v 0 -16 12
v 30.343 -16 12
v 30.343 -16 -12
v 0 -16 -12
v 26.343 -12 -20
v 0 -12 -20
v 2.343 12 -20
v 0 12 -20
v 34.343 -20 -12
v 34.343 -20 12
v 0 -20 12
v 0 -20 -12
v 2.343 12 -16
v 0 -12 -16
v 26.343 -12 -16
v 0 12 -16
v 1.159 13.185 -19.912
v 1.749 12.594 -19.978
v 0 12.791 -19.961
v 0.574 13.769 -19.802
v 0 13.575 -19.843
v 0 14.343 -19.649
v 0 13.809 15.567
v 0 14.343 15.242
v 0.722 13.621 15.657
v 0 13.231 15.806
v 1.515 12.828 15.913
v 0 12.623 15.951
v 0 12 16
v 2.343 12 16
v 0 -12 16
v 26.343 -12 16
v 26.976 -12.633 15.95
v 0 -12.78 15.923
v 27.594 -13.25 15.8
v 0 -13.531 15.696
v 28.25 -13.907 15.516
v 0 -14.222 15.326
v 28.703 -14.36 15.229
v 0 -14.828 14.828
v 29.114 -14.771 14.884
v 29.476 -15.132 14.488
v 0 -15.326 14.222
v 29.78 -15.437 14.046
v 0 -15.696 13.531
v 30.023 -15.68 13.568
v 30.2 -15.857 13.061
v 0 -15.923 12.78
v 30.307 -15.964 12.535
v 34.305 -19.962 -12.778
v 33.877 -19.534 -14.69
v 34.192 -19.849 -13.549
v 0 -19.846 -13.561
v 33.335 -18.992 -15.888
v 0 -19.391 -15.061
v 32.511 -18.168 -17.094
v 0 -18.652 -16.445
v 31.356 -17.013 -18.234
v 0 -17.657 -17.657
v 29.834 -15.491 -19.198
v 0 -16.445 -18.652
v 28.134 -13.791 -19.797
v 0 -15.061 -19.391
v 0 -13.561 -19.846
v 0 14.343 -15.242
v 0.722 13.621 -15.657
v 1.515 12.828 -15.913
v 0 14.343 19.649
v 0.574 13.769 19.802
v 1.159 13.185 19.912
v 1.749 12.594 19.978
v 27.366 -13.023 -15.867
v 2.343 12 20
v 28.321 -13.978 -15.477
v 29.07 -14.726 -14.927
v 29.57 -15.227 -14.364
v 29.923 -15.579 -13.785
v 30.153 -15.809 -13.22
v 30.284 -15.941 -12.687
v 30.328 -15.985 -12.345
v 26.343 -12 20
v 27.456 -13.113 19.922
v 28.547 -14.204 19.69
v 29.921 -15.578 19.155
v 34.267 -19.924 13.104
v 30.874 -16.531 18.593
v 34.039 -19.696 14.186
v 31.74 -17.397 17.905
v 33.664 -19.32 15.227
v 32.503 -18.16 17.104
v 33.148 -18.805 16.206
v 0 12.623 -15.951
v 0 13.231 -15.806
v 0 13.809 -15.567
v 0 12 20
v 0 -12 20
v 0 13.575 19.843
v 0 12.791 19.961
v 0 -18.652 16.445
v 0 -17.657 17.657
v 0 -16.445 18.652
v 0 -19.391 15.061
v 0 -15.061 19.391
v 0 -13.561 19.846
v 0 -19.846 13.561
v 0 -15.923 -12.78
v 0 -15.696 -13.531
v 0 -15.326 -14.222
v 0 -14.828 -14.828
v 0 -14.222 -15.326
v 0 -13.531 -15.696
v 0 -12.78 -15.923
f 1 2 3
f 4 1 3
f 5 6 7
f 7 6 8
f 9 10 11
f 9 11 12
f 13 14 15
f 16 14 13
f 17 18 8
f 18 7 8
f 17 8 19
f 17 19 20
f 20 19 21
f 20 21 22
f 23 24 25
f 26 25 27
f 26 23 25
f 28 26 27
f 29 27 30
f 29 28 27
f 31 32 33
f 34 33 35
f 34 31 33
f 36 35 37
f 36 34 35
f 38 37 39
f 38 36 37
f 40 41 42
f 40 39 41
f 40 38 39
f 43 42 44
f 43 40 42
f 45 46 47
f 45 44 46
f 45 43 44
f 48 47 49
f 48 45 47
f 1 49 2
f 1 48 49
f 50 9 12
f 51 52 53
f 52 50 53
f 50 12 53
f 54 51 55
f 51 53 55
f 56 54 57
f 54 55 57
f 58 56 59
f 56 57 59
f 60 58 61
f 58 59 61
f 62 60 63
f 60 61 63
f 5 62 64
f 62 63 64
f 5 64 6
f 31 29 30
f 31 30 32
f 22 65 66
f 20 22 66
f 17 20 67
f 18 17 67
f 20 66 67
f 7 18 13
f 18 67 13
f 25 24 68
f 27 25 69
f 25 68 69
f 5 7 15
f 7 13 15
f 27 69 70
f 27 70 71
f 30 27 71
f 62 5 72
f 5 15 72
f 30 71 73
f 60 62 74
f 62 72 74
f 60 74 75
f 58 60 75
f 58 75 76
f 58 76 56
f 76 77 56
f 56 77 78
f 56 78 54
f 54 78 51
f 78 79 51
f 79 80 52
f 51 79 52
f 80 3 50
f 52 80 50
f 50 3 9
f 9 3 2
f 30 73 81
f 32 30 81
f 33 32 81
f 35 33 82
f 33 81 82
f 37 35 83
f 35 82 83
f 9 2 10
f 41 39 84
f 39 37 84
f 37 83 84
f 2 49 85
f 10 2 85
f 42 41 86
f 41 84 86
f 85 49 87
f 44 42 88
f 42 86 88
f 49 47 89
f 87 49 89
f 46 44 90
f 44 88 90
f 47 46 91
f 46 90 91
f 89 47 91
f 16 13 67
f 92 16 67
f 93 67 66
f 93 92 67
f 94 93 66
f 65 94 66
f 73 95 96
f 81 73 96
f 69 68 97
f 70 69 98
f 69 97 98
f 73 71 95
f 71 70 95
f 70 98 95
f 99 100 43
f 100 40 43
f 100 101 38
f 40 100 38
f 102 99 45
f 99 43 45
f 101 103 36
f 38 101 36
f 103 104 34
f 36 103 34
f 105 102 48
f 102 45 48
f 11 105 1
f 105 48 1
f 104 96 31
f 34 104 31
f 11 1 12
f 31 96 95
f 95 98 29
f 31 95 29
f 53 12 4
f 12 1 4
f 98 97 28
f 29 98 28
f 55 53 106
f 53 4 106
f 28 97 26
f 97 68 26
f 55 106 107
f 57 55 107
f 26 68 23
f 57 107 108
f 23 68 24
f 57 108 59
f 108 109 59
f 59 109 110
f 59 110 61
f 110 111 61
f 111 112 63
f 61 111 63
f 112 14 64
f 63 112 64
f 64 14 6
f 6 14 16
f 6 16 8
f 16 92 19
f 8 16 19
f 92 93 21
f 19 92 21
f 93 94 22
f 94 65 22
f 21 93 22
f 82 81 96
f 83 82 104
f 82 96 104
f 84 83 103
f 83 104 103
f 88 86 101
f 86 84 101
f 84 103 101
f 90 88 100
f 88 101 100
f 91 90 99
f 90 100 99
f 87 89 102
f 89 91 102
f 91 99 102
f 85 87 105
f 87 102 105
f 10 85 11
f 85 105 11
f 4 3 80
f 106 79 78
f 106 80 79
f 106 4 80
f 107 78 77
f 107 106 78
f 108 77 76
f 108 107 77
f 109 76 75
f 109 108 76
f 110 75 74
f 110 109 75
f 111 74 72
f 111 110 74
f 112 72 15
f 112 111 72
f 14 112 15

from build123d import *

# Parameters (mm, degrees)
TUBO_CUADRADO_40_X_40_X_4_1_DEPTH = 40
EXTRUDE1_REACH                    = 62


with BuildPart() as part:
    # Sketch6 → Tubo cuadrado 40 X 40 X 4(1) (new body)
    with BuildSketch(Plane(origin=(0, 0, 0), x_dir=(0, 0, -1), z_dir=(1, 0, 0))):
        with BuildLine():
            Line((-12, -20), (12, -20))
            ThreePointArc((12, -20), (17.656854249, -17.656854249), (20, -12))
            Line((20, -12), (20, 12))
            ThreePointArc((20, 12), (17.656854249, 17.656854249), (12, 20))
            Line((12, 20), (-12, 20))
            ThreePointArc((-12, 20), (-17.656854249, 17.656854249), (-20, 12))
            Line((-20, 12), (-20, -12))
            ThreePointArc((-20, -12), (-17.656854249, -17.656854249), (-12, -20))
        make_face()
        with BuildLine():
            Line((-12, -16), (12, -16))
            ThreePointArc((12, -16), (14.828427125, -14.828427125), (16, -12))
            Line((16, -12), (16, 12))
            ThreePointArc((16, 12), (14.828427125, 14.828427125), (12, 16))
            Line((12, 16), (-12, 16))
            ThreePointArc((-12, 16), (-14.828427125, 14.828427125), (-16, 12))
            Line((-16, 12), (-16, -12))
            ThreePointArc((-16, -12), (-14.828427125, -14.828427125), (-12, -16))
        make_face(mode=Mode.SUBTRACT)
    extrude(amount=TUBO_CUADRADO_40_X_40_X_4_1_DEPTH)

    # Sketch2 → Extrude1 (cut, up to next)
    with BuildSketch(Plane.XY.offset(20), mode=Mode.PRIVATE) as extrude1_sk1:
        Polygon((-9.656854249, 24), (44, -29.656854249), (44, 24), align=None)
    extrude1_tool1 = extrude(extrude1_sk1.sketch, amount=-EXTRUDE1_REACH, mode=Mode.PRIVATE) & part.part
    add(extrude1_tool1.solids().sort_by_distance((26.114382, 6.114382, 20))[0], mode=Mode.SUBTRACT)


solid = part.part
